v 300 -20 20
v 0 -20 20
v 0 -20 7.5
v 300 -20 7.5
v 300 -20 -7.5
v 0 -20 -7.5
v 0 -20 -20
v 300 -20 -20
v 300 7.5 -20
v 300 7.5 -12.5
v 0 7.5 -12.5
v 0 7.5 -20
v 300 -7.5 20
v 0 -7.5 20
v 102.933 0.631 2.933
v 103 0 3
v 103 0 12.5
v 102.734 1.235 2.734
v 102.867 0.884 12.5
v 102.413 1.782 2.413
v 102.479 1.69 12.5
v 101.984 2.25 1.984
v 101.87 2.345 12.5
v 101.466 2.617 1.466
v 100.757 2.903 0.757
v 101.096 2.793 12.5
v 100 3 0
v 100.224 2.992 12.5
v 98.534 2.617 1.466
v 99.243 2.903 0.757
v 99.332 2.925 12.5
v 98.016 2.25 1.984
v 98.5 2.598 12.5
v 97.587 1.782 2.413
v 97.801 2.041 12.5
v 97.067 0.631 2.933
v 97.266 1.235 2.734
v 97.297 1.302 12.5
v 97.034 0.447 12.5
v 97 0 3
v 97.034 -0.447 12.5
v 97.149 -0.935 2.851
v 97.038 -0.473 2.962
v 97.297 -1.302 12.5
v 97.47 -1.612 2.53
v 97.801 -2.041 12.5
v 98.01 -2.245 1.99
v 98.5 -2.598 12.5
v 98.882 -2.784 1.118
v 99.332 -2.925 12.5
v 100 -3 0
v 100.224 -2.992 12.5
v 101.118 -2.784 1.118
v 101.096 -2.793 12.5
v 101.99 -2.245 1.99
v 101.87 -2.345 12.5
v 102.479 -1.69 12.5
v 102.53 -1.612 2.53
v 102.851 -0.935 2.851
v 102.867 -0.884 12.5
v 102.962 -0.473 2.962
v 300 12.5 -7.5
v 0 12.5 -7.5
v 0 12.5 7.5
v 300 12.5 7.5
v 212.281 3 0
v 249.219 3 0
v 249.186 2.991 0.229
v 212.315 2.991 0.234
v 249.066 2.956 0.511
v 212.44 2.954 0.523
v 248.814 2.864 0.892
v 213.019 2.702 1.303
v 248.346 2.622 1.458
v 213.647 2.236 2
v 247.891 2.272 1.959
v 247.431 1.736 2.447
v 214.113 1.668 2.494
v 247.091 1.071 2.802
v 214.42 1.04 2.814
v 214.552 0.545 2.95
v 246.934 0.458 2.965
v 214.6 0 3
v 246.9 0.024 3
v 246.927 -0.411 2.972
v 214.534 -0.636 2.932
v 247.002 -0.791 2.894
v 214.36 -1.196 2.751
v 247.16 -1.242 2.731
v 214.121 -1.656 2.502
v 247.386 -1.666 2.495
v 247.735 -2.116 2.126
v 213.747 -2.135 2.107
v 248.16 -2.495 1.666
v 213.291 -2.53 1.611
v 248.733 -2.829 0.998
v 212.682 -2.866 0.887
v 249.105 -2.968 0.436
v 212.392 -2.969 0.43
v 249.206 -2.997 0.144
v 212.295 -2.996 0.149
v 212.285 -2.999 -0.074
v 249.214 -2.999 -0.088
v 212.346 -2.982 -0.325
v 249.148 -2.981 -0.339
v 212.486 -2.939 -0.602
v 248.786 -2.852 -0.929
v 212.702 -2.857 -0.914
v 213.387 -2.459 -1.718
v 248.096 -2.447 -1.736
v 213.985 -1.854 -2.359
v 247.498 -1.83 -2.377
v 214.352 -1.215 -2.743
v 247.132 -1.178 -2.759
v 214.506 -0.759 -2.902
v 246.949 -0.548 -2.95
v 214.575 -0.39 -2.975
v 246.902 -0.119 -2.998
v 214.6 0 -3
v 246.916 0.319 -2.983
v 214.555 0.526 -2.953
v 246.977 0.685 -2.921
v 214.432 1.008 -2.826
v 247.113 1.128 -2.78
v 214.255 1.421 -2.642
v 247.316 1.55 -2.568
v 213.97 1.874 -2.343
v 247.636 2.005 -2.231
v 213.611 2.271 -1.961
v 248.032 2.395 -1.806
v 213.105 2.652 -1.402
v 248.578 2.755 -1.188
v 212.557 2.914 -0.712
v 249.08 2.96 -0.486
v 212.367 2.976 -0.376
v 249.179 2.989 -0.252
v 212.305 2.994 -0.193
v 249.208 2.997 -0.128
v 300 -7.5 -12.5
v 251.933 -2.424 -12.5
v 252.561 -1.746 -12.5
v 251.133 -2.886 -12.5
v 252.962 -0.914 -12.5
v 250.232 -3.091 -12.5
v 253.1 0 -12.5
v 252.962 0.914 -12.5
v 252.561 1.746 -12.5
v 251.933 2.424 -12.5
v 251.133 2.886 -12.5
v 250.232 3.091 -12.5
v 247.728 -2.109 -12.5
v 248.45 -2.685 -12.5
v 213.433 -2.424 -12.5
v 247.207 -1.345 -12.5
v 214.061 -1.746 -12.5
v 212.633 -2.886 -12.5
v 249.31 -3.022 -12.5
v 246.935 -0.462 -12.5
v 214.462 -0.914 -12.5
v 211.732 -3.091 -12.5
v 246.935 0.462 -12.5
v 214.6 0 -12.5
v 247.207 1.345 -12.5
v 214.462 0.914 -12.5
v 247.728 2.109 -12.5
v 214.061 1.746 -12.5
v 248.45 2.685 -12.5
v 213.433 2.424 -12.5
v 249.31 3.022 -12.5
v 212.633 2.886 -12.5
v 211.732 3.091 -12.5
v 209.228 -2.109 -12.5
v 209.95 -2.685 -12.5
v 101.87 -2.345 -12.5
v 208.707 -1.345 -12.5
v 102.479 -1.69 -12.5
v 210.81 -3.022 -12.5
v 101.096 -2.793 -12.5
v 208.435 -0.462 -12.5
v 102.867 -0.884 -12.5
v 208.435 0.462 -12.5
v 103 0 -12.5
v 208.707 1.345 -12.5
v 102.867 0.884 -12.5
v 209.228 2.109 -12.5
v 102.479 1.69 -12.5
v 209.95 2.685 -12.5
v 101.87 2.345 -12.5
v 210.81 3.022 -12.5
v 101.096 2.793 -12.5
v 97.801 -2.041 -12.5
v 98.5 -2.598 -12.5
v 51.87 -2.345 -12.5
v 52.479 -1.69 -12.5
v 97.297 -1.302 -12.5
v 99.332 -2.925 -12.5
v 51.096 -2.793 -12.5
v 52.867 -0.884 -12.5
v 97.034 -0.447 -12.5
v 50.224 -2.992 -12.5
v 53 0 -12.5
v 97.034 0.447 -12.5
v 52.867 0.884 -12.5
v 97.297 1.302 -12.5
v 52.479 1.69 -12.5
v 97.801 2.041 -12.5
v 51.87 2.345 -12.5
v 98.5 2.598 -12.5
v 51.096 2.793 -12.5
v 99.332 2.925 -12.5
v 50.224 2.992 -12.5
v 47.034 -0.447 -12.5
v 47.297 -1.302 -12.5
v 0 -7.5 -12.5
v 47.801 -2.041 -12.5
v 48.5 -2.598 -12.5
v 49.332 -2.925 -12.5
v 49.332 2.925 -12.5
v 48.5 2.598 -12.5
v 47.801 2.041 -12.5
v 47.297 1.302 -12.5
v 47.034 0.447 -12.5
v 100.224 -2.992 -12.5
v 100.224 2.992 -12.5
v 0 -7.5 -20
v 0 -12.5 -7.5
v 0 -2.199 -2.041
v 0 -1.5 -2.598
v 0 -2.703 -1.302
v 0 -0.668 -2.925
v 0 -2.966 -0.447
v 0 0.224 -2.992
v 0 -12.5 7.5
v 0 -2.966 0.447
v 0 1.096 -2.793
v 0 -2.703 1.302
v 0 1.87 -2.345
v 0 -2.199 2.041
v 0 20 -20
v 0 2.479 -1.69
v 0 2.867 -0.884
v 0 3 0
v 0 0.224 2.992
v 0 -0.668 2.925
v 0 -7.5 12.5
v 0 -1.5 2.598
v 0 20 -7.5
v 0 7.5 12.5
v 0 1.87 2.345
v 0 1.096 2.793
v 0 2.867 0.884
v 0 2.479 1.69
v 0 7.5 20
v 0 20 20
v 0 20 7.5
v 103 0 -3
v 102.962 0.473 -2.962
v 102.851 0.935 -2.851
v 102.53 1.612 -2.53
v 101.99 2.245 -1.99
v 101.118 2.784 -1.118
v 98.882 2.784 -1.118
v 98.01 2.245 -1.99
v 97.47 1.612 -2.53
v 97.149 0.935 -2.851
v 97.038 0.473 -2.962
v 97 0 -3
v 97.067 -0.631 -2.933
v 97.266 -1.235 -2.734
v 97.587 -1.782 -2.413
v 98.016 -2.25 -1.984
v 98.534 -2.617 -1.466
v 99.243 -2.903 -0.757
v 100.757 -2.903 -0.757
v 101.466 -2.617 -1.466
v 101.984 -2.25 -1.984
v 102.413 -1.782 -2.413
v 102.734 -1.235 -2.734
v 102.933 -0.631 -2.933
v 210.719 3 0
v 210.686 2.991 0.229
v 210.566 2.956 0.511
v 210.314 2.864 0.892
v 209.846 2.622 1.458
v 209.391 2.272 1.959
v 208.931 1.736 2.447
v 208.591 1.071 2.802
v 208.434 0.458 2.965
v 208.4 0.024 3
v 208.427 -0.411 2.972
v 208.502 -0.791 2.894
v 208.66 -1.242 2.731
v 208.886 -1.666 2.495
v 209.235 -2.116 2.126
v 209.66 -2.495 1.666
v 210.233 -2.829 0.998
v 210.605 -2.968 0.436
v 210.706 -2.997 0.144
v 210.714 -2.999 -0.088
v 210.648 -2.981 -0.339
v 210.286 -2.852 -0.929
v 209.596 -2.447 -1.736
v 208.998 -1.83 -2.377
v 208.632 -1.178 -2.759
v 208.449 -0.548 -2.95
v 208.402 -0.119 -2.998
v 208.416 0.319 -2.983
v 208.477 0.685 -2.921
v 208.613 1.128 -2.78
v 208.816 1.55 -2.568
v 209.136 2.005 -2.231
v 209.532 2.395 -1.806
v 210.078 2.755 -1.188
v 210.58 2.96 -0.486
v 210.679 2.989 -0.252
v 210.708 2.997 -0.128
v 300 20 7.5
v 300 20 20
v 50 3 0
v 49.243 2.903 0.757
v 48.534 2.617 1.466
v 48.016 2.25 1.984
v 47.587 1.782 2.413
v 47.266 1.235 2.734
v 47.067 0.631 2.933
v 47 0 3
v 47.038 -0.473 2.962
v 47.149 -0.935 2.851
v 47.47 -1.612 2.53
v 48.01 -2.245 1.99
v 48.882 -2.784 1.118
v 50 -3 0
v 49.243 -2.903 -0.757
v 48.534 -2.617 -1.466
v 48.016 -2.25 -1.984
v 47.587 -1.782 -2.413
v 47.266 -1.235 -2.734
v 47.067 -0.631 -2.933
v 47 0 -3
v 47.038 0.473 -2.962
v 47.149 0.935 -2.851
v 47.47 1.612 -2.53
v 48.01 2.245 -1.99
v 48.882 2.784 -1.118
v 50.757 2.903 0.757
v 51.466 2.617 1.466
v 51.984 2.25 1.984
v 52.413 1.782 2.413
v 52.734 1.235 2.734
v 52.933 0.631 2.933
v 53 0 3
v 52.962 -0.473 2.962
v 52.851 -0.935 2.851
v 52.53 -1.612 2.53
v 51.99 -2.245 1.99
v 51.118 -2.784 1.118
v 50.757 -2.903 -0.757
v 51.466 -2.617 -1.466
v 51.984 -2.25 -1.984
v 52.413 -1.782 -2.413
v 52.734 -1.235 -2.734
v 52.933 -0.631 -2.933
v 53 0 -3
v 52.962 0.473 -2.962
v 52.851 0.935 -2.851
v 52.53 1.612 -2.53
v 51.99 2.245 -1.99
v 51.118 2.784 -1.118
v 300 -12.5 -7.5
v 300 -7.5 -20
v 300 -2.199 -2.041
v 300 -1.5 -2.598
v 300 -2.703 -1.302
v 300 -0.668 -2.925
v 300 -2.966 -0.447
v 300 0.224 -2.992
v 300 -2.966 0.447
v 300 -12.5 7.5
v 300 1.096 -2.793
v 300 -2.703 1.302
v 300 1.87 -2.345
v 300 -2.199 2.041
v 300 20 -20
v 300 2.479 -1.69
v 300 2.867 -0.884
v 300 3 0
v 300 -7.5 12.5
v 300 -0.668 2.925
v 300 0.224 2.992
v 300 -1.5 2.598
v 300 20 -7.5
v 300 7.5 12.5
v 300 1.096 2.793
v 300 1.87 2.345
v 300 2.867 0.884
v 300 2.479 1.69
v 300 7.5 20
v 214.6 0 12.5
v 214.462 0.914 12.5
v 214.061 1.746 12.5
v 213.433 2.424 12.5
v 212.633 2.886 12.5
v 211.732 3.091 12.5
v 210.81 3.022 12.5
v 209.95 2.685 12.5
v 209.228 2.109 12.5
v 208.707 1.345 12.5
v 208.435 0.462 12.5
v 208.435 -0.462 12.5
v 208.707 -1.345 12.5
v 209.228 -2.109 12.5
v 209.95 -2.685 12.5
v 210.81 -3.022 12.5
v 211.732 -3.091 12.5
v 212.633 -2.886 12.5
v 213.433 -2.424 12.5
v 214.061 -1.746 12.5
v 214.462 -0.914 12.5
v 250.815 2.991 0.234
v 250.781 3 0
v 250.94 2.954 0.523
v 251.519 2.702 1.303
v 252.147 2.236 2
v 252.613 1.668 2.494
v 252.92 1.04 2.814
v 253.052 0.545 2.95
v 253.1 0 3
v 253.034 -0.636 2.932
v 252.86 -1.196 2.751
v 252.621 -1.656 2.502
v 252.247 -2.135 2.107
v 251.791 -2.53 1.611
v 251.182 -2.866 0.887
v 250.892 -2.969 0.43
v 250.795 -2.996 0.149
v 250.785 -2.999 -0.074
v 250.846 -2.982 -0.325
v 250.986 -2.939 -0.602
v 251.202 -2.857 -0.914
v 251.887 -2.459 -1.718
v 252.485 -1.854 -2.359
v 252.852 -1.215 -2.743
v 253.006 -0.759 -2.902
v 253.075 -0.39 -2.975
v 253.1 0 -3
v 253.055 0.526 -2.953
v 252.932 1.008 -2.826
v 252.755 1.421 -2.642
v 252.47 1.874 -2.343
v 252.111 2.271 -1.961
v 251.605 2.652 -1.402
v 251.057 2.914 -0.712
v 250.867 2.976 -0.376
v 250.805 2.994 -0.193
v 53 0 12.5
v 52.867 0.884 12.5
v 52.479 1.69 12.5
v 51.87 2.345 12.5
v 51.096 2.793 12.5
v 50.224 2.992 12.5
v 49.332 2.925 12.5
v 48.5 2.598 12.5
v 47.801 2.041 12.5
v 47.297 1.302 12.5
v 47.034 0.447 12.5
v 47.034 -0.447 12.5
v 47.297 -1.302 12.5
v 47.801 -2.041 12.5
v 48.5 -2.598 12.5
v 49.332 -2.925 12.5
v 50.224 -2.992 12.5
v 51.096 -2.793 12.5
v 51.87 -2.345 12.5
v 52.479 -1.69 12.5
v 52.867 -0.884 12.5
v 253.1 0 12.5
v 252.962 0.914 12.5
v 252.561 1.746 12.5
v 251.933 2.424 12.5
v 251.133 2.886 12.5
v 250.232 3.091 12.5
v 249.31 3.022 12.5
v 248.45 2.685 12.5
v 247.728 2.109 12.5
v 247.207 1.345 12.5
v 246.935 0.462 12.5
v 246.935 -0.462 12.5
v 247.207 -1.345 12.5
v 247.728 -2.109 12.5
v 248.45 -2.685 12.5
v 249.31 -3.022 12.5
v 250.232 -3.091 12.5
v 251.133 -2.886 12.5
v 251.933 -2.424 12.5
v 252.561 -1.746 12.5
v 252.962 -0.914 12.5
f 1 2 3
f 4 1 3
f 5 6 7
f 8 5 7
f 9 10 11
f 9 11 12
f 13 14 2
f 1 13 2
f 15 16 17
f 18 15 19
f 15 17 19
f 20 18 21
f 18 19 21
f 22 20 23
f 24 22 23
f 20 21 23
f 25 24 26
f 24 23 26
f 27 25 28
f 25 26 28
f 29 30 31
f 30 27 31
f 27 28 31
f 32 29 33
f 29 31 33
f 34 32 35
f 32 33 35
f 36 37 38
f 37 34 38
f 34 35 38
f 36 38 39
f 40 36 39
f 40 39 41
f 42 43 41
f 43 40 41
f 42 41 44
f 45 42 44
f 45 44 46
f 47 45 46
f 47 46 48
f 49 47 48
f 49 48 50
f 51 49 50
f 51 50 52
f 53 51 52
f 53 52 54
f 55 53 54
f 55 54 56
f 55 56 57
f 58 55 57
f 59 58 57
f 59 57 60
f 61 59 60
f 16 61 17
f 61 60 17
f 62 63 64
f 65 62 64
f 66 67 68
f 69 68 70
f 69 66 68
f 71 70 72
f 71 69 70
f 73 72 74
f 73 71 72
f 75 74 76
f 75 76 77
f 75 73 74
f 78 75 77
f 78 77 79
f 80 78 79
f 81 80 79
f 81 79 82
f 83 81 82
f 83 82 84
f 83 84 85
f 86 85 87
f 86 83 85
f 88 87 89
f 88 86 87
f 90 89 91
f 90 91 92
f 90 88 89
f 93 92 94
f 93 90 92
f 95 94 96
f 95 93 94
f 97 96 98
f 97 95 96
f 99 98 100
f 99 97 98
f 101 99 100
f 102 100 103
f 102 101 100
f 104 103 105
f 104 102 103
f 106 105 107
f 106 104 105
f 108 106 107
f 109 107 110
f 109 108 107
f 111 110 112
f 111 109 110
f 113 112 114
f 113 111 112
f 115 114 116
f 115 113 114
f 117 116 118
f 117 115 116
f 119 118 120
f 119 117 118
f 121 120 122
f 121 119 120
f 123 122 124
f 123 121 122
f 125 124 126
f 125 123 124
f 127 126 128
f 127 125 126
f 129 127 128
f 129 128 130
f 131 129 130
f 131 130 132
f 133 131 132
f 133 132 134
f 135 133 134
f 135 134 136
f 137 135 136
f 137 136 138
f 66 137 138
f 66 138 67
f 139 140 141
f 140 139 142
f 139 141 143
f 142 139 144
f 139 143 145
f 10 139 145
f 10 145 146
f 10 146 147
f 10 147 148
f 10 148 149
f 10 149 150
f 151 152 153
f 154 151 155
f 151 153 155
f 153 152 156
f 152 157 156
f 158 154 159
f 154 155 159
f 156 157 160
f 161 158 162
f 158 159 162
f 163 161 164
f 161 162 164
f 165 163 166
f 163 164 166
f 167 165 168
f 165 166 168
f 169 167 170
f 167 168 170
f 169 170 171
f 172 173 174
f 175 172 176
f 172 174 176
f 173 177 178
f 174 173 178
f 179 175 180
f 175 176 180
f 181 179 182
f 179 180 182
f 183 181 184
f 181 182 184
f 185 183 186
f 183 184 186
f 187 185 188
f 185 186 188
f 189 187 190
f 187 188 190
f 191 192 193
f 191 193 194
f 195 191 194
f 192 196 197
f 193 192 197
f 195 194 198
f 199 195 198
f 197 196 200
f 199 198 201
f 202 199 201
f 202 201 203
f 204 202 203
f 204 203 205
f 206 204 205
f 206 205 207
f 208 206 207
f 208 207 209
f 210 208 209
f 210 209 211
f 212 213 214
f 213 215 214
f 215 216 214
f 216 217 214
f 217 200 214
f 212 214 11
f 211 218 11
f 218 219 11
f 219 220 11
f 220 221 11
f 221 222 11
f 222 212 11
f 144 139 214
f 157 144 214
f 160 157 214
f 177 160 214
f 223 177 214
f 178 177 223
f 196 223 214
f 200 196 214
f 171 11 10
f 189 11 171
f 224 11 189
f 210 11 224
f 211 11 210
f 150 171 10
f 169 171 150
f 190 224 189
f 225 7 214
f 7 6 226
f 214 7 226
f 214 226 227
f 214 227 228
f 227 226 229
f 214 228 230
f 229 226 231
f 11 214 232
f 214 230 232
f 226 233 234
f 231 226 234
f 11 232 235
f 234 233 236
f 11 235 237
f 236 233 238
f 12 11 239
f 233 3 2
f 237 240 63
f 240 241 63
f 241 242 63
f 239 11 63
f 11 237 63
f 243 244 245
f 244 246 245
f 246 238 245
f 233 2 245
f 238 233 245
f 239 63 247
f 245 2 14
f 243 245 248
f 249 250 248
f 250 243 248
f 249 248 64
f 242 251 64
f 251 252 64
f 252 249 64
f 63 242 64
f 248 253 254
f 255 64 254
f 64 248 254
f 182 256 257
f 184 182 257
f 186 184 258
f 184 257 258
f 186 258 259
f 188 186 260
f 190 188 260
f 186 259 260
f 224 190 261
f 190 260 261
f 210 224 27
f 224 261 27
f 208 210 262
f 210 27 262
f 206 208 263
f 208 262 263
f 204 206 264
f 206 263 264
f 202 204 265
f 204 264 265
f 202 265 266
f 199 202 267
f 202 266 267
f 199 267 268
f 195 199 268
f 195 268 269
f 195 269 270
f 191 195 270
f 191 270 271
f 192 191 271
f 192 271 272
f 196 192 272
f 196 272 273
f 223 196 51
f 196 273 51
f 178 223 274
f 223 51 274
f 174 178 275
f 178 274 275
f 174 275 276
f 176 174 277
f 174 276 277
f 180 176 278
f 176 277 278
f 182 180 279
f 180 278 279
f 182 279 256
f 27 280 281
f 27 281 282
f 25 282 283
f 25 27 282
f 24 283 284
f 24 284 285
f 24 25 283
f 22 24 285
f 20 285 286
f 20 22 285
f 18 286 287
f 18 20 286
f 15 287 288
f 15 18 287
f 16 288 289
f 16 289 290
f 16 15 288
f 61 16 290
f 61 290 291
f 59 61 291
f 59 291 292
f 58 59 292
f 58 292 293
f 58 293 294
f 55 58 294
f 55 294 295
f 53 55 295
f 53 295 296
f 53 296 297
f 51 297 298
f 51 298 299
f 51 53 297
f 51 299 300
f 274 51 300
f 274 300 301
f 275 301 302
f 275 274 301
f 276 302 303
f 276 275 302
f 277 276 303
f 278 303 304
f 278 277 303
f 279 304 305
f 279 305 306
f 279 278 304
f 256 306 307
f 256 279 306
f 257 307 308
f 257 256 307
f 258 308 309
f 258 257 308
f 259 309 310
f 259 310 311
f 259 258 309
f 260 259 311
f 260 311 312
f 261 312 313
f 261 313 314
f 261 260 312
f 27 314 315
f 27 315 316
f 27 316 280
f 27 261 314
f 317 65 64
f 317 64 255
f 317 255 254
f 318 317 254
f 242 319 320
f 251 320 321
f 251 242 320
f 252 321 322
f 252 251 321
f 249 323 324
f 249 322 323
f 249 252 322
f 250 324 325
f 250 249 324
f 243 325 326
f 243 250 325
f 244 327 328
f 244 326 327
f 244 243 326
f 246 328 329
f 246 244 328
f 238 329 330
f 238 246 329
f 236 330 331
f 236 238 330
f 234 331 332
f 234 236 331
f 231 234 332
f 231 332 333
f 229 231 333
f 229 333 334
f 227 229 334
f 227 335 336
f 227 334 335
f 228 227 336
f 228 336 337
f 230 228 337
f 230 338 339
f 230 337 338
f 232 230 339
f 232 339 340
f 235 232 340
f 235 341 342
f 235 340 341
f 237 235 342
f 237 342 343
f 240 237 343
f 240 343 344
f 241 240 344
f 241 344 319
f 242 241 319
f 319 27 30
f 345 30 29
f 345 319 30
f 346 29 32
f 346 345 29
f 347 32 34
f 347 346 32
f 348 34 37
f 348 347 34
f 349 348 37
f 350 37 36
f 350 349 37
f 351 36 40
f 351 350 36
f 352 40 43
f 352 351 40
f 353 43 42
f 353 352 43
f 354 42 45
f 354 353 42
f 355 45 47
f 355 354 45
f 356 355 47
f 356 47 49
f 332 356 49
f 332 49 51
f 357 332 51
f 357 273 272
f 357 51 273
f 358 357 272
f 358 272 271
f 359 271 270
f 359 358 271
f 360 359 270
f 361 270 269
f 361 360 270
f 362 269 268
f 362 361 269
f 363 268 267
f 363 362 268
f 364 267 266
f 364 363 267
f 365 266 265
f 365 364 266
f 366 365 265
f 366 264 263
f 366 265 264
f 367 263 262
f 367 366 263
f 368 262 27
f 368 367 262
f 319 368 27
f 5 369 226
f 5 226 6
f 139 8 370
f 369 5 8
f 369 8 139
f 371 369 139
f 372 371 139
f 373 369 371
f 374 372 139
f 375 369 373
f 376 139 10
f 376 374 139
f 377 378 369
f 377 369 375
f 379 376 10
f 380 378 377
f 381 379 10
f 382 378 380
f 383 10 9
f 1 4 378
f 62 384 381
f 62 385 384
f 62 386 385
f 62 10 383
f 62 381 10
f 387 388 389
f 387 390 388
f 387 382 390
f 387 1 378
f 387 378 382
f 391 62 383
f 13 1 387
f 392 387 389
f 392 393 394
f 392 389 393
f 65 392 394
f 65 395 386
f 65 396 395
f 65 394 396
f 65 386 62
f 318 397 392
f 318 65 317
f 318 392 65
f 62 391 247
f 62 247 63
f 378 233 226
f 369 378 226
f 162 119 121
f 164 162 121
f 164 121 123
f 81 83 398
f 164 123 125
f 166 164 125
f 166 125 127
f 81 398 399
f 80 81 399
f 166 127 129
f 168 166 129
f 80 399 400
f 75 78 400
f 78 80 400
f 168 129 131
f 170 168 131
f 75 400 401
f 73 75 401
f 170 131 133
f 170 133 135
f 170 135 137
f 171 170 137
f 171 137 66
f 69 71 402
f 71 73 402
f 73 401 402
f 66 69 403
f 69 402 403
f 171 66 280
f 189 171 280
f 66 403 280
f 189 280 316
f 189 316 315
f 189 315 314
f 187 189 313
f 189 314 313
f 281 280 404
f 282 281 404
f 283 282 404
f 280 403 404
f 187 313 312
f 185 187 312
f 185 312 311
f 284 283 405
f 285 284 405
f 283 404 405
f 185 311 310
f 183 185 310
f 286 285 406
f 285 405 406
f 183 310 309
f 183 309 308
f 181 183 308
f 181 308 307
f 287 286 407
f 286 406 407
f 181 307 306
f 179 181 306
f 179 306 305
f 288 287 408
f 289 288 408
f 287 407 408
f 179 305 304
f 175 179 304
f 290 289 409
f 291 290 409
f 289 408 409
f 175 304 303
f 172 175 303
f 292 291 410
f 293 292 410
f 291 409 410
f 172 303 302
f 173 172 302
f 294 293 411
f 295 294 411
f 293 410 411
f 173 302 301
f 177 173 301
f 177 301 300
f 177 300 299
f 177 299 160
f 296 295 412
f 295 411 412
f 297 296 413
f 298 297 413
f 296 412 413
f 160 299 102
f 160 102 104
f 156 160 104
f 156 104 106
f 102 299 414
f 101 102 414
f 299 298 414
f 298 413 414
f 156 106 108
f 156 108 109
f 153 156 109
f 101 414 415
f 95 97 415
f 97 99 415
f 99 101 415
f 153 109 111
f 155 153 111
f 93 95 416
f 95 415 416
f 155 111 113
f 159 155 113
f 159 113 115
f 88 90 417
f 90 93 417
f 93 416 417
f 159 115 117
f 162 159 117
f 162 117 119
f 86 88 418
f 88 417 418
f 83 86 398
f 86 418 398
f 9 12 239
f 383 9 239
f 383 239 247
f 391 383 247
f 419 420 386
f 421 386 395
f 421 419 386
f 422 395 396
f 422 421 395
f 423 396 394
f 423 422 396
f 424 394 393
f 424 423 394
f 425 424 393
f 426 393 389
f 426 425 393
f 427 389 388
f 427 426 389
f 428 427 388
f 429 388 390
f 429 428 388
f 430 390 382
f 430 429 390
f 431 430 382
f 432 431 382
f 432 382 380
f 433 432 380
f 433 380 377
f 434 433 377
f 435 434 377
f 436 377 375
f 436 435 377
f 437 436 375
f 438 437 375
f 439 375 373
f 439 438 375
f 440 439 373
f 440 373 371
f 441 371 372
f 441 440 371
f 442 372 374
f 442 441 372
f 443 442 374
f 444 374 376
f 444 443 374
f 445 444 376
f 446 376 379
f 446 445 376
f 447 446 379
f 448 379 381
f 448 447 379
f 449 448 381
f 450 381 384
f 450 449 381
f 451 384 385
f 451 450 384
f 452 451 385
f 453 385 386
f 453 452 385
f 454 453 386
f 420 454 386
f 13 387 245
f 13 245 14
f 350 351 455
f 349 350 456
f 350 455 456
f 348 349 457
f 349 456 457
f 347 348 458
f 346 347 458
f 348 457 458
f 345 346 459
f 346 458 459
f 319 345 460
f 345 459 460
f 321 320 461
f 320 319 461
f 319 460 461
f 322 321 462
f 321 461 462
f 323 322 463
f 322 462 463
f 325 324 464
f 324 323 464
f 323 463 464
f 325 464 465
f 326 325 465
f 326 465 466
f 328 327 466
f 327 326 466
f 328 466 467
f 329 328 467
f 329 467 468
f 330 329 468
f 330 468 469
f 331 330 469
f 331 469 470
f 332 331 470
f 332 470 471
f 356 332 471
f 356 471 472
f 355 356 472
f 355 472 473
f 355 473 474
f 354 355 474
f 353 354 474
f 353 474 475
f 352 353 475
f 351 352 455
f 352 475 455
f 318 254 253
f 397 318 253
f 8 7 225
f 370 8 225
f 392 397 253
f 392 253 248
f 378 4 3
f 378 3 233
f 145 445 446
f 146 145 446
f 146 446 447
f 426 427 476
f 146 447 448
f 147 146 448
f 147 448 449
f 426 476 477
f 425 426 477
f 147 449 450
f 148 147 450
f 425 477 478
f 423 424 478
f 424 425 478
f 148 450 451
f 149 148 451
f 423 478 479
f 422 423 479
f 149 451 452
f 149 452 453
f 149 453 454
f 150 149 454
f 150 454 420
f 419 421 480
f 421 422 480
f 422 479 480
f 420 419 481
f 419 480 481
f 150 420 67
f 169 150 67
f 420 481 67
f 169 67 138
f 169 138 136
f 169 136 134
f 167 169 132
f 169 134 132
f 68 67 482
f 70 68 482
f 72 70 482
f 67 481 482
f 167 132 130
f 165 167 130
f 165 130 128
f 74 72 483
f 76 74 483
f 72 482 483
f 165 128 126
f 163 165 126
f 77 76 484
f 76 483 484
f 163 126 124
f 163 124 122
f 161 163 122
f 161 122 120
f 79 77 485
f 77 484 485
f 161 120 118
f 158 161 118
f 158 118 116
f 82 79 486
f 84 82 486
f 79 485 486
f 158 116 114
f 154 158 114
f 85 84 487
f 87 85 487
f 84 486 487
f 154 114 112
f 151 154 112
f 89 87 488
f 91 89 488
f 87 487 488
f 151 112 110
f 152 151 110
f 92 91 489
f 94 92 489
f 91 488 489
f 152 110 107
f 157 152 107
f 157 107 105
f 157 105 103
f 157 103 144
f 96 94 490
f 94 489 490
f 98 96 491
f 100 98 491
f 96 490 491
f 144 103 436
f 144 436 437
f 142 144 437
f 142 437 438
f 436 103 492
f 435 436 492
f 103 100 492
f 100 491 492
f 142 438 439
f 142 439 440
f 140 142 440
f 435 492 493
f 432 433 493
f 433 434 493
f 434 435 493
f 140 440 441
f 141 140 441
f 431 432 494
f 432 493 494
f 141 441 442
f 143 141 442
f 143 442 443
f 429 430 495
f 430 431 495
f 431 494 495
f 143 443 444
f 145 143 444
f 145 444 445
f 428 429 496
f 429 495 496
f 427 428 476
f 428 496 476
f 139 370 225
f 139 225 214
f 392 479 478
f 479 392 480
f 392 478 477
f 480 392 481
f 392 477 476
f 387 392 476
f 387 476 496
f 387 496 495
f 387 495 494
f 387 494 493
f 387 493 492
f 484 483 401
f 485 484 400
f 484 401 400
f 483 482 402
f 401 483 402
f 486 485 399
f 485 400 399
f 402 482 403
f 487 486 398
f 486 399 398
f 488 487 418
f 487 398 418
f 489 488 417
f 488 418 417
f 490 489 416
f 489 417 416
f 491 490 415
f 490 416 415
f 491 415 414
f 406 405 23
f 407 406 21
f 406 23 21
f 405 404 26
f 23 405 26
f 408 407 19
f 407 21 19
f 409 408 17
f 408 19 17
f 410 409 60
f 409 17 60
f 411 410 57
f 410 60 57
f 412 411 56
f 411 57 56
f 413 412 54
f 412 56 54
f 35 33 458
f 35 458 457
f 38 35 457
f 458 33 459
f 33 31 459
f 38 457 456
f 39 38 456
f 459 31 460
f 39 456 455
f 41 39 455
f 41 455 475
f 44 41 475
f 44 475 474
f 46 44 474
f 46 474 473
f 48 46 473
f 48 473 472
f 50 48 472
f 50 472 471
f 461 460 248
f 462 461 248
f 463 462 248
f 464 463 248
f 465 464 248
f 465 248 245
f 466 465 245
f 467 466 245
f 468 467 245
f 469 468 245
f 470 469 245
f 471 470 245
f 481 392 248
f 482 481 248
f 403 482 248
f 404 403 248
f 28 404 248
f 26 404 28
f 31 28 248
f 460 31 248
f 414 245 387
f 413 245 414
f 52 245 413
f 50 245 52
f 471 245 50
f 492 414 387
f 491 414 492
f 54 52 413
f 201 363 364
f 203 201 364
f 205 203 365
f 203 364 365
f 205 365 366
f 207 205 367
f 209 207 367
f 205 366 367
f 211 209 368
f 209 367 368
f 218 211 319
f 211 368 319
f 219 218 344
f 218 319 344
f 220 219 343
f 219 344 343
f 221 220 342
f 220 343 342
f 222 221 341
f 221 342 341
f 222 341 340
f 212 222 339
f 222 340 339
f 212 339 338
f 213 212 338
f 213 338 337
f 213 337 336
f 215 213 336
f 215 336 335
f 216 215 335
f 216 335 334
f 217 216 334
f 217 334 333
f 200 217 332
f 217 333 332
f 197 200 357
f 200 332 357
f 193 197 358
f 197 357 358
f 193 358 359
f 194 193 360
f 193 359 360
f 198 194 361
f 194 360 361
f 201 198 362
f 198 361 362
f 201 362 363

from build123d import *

# Parameters (mm, degrees)
F0_R     = 3
F1_DEPTH = 300
F2_R     = 3.1
F3_DEPTH = 50
F4_R     = 3
F5_DEPTH = 50


with BuildPart() as f1:
    # F0 (on Right) → F1 (new body)
    with BuildSketch(Plane.YZ):
        Polygon((20, 7.5), (20, 20), (7.5, 20), (7.5, 12.5), (-7.5, 12.5), (-7.5, 20), (-20, 20), (-20, 7.5), (-12.5, 7.5), (-12.5, -7.5), (-20, -7.5), (-20, -20), (-7.5, -20), (-7.5, -12.5), (7.5, -12.5), (7.5, -20), (20, -20), (20, -7.5), (12.5, -7.5), (12.5, 7.5), align=None)
        Circle(F0_R, mode=Mode.SUBTRACT)
    extrude(amount=F1_DEPTH)

    # F2 (on face) → F3 (cut)
    with BuildSketch(Plane.XY.offset(12.5)):
        with Locations((250, 0)):
            Circle(F2_R)
        with Locations((211.5, 0)):
            Circle(F2_R)
    extrude(amount=-F3_DEPTH, mode=Mode.SUBTRACT)

    # F4 (on face) → F5 (cut)
    with BuildSketch(Plane.XY.offset(12.5)):
        with Locations((50, 0)):
            Circle(F4_R)
        with Locations((100, 0)):
            Circle(F4_R)
    extrude(amount=-F5_DEPTH, mode=Mode.SUBTRACT)


solid = f1.part
